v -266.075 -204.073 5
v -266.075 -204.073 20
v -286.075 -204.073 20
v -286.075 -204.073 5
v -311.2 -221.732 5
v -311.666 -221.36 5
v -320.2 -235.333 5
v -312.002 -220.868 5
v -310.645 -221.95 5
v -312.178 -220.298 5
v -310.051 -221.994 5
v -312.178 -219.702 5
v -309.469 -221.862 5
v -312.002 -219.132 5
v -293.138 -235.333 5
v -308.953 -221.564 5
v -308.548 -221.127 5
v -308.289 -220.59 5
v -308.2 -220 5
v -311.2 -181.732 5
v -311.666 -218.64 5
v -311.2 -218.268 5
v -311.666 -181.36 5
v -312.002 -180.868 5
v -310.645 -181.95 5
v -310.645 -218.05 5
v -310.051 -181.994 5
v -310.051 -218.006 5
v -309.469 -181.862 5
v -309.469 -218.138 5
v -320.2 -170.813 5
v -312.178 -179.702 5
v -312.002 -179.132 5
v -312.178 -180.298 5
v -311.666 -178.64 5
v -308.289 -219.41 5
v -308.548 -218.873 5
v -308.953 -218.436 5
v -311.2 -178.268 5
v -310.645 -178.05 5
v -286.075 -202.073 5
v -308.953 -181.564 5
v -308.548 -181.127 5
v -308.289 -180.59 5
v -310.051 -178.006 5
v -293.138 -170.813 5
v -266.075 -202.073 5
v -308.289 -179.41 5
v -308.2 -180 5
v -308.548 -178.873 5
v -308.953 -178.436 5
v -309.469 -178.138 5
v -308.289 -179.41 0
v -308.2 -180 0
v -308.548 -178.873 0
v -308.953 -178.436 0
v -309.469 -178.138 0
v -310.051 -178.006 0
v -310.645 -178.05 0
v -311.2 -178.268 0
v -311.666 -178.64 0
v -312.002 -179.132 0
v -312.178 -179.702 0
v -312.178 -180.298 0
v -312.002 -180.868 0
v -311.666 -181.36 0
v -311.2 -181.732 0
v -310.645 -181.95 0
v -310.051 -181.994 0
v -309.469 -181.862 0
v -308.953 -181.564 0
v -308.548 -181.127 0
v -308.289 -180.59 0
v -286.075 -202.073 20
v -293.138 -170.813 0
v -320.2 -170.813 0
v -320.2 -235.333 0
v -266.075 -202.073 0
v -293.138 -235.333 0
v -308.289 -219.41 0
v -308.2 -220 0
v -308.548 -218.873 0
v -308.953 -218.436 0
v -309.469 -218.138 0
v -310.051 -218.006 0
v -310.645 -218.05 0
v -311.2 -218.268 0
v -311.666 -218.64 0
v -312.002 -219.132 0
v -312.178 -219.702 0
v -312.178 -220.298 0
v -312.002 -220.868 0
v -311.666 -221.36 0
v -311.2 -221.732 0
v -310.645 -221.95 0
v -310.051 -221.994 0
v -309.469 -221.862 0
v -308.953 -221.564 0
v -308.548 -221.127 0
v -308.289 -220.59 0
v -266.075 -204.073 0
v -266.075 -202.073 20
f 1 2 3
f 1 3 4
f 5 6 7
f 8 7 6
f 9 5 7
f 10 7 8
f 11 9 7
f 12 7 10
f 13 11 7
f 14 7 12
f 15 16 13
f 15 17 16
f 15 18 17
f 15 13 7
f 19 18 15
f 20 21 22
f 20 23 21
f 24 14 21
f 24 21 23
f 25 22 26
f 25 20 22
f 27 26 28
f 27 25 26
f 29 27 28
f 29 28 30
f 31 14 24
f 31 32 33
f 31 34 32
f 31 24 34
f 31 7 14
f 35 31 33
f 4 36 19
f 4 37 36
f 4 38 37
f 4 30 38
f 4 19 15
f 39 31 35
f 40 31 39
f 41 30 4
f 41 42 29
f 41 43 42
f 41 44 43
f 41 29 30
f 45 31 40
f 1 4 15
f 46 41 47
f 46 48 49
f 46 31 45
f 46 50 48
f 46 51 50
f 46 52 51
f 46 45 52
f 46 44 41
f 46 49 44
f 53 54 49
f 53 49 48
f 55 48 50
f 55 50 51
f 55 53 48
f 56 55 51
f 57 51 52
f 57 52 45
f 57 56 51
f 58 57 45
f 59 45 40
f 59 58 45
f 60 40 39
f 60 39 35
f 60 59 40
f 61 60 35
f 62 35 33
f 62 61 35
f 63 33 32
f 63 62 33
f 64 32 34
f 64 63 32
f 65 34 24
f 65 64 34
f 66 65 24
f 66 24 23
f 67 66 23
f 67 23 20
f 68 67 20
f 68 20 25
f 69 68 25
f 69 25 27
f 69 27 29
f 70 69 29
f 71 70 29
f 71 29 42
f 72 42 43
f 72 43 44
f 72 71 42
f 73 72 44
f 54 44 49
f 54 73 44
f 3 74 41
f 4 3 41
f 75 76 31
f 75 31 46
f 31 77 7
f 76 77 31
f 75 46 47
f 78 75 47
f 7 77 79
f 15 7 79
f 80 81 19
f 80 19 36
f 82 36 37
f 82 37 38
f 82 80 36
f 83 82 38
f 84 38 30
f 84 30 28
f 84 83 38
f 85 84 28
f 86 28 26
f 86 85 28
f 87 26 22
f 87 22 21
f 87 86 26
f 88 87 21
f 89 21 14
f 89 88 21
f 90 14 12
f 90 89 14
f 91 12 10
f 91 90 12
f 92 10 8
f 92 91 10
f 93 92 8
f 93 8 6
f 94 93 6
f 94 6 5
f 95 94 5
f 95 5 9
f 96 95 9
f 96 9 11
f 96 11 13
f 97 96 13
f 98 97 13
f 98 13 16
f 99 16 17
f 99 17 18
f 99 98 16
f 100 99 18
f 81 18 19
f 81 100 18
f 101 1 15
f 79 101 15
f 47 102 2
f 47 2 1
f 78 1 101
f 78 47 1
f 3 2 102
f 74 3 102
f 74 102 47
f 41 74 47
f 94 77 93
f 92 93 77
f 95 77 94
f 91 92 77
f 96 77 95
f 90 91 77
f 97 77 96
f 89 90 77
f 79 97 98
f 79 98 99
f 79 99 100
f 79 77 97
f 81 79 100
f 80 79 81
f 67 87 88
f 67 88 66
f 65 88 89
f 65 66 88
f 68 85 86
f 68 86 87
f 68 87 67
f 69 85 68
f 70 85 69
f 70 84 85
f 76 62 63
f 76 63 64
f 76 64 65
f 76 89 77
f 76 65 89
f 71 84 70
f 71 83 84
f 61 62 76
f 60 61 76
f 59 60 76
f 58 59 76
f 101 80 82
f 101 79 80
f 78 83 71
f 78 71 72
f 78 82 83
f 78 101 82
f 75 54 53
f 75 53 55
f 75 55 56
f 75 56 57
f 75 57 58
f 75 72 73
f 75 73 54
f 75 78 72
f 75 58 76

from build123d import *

# Parameters (mm, degrees)
SKETCH1_W           = 54.124737276
SKETCH1_H           = 64.519725693
SKETCH1_R           = 2
BOSS_EXTRUDE1_DEPTH = 5
SKETCH7_W           = 20
SKETCH7_H           = 2
BOSS_EXTRUDE4_DEPTH = 20
CUT_EXTRUDE4_DEPTH  = 7


with BuildPart() as part:
    # Sketch1 → Boss-Extrude1 (new body)
    with BuildSketch(Plane.XY):
        with Locations((-293.137631362, -203.073045314)):
            Rectangle(SKETCH1_W, SKETCH1_H)
        with Locations((-310.2, -180)):
            Circle(SKETCH1_R, mode=Mode.SUBTRACT)
        with Locations((-310.2, -220)):
            Circle(SKETCH1_R, mode=Mode.SUBTRACT)
    extrude(amount=BOSS_EXTRUDE1_DEPTH)

    # Sketch7 → Boss-Extrude4 (add)
    with BuildSketch(Plane(origin=(-266.075262724, 0, 0), x_dir=(0, 0, -1), z_dir=(1, 0, 0))):
        with Locations((-10, -203.073045313)):
            Rectangle(SKETCH7_W, SKETCH7_H)
    extrude(amount=-BOSS_EXTRUDE4_DEPTH)

    # Sketch8 → Cut-Extrude4 (cut)
    with BuildSketch(Plane.XY.offset(5)):
        Polygon((-266.075262724, -204.073045313), (-293.137631362, -235.33290816), (-266.075262724, -235.33290816), align=None)
        Polygon((-293.137631362, -170.813182467), (-266.075262724, -202.073045313), (-266.075262724, -170.813182467), align=None)
    extrude(amount=-CUT_EXTRUDE4_DEPTH, mode=Mode.SUBTRACT)


solid = part.part
